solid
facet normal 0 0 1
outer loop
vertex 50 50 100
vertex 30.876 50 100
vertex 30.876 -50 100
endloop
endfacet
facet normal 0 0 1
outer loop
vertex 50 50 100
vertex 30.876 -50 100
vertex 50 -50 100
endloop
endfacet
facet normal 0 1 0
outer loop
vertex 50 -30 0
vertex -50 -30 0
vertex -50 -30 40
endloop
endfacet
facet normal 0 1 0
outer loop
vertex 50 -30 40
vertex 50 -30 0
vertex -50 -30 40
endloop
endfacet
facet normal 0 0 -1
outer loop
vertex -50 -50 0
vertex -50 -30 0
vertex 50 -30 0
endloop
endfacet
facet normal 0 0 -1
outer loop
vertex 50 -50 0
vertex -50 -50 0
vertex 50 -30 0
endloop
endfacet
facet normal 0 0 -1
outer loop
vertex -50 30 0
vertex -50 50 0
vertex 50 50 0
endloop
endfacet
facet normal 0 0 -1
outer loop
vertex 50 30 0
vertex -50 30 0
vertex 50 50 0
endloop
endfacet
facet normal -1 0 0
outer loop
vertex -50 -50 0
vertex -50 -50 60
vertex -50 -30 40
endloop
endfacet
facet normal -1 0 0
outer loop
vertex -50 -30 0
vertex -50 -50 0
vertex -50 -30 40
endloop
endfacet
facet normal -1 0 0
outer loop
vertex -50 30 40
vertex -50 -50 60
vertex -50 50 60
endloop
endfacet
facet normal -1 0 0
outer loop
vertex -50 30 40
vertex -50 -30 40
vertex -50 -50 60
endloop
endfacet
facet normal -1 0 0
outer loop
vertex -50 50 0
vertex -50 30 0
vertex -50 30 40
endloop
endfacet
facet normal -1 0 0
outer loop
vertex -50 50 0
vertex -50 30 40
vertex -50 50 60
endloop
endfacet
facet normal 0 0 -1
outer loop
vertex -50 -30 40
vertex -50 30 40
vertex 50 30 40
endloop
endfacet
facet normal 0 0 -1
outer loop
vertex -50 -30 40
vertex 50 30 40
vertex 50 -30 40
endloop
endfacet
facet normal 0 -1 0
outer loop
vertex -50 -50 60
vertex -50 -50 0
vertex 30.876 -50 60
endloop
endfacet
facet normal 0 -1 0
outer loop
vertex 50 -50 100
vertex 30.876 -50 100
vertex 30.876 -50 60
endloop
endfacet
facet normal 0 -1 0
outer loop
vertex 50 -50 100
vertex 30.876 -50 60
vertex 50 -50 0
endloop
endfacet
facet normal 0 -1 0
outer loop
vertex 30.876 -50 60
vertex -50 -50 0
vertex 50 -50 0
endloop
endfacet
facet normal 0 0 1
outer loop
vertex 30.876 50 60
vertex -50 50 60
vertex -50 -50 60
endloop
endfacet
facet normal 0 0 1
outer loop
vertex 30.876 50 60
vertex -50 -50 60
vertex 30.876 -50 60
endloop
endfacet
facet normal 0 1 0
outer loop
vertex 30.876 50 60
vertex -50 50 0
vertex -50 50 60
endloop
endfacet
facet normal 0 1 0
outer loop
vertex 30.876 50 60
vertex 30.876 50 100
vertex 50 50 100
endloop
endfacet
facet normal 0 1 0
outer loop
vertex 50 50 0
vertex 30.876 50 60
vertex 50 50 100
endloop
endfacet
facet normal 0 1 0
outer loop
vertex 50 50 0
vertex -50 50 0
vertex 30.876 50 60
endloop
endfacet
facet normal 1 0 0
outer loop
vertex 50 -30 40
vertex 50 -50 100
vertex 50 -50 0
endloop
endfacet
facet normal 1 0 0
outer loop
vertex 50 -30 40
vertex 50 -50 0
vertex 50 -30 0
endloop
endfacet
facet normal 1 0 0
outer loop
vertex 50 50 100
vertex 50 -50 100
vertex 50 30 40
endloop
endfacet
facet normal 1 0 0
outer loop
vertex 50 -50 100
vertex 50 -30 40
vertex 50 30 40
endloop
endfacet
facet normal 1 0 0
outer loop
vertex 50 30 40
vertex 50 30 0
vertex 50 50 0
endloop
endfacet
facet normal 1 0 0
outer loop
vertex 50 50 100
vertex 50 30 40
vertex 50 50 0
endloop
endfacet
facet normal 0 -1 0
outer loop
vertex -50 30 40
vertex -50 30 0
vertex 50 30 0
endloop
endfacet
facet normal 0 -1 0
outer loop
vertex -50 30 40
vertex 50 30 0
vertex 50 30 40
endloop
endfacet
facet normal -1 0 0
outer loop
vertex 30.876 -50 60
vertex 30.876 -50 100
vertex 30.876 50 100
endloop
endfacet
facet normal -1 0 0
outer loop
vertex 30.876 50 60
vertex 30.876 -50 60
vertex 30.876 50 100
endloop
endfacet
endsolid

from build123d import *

# Parameters (mm, degrees)
F0_W     = 100
F0_H     = 100
F1_DEPTH = 100
F2_W     = 80.875554
F2_H     = 100
F3_DEPTH = 40
F4_W     = 60
F4_H     = 40
F5_DEPTH = 100.001


with BuildPart() as f1:
    # F0 (on Top) → F1 (new body)
    with BuildSketch(Plane.XY):
        Rectangle(F0_W, F0_H)
    extrude(amount=F1_DEPTH)

    # F2 (on face) → F3 (cut)
    with BuildSketch(Plane.XY.offset(100)):
        with Locations((-9.562223, 0)):
            Rectangle(F2_W, F2_H)
    extrude(amount=-F3_DEPTH, mode=Mode.SUBTRACT)

    # F4 (on face) → F5 (cut, through all)
    with BuildSketch(Plane(origin=(-50, 0, 0), x_dir=(0, -1, 0), z_dir=(-1, 0, 0))):
        with Locations((0, 20)):
            Rectangle(F4_W, F4_H)
    extrude(amount=-F5_DEPTH, mode=Mode.SUBTRACT)


solid = f1.part
